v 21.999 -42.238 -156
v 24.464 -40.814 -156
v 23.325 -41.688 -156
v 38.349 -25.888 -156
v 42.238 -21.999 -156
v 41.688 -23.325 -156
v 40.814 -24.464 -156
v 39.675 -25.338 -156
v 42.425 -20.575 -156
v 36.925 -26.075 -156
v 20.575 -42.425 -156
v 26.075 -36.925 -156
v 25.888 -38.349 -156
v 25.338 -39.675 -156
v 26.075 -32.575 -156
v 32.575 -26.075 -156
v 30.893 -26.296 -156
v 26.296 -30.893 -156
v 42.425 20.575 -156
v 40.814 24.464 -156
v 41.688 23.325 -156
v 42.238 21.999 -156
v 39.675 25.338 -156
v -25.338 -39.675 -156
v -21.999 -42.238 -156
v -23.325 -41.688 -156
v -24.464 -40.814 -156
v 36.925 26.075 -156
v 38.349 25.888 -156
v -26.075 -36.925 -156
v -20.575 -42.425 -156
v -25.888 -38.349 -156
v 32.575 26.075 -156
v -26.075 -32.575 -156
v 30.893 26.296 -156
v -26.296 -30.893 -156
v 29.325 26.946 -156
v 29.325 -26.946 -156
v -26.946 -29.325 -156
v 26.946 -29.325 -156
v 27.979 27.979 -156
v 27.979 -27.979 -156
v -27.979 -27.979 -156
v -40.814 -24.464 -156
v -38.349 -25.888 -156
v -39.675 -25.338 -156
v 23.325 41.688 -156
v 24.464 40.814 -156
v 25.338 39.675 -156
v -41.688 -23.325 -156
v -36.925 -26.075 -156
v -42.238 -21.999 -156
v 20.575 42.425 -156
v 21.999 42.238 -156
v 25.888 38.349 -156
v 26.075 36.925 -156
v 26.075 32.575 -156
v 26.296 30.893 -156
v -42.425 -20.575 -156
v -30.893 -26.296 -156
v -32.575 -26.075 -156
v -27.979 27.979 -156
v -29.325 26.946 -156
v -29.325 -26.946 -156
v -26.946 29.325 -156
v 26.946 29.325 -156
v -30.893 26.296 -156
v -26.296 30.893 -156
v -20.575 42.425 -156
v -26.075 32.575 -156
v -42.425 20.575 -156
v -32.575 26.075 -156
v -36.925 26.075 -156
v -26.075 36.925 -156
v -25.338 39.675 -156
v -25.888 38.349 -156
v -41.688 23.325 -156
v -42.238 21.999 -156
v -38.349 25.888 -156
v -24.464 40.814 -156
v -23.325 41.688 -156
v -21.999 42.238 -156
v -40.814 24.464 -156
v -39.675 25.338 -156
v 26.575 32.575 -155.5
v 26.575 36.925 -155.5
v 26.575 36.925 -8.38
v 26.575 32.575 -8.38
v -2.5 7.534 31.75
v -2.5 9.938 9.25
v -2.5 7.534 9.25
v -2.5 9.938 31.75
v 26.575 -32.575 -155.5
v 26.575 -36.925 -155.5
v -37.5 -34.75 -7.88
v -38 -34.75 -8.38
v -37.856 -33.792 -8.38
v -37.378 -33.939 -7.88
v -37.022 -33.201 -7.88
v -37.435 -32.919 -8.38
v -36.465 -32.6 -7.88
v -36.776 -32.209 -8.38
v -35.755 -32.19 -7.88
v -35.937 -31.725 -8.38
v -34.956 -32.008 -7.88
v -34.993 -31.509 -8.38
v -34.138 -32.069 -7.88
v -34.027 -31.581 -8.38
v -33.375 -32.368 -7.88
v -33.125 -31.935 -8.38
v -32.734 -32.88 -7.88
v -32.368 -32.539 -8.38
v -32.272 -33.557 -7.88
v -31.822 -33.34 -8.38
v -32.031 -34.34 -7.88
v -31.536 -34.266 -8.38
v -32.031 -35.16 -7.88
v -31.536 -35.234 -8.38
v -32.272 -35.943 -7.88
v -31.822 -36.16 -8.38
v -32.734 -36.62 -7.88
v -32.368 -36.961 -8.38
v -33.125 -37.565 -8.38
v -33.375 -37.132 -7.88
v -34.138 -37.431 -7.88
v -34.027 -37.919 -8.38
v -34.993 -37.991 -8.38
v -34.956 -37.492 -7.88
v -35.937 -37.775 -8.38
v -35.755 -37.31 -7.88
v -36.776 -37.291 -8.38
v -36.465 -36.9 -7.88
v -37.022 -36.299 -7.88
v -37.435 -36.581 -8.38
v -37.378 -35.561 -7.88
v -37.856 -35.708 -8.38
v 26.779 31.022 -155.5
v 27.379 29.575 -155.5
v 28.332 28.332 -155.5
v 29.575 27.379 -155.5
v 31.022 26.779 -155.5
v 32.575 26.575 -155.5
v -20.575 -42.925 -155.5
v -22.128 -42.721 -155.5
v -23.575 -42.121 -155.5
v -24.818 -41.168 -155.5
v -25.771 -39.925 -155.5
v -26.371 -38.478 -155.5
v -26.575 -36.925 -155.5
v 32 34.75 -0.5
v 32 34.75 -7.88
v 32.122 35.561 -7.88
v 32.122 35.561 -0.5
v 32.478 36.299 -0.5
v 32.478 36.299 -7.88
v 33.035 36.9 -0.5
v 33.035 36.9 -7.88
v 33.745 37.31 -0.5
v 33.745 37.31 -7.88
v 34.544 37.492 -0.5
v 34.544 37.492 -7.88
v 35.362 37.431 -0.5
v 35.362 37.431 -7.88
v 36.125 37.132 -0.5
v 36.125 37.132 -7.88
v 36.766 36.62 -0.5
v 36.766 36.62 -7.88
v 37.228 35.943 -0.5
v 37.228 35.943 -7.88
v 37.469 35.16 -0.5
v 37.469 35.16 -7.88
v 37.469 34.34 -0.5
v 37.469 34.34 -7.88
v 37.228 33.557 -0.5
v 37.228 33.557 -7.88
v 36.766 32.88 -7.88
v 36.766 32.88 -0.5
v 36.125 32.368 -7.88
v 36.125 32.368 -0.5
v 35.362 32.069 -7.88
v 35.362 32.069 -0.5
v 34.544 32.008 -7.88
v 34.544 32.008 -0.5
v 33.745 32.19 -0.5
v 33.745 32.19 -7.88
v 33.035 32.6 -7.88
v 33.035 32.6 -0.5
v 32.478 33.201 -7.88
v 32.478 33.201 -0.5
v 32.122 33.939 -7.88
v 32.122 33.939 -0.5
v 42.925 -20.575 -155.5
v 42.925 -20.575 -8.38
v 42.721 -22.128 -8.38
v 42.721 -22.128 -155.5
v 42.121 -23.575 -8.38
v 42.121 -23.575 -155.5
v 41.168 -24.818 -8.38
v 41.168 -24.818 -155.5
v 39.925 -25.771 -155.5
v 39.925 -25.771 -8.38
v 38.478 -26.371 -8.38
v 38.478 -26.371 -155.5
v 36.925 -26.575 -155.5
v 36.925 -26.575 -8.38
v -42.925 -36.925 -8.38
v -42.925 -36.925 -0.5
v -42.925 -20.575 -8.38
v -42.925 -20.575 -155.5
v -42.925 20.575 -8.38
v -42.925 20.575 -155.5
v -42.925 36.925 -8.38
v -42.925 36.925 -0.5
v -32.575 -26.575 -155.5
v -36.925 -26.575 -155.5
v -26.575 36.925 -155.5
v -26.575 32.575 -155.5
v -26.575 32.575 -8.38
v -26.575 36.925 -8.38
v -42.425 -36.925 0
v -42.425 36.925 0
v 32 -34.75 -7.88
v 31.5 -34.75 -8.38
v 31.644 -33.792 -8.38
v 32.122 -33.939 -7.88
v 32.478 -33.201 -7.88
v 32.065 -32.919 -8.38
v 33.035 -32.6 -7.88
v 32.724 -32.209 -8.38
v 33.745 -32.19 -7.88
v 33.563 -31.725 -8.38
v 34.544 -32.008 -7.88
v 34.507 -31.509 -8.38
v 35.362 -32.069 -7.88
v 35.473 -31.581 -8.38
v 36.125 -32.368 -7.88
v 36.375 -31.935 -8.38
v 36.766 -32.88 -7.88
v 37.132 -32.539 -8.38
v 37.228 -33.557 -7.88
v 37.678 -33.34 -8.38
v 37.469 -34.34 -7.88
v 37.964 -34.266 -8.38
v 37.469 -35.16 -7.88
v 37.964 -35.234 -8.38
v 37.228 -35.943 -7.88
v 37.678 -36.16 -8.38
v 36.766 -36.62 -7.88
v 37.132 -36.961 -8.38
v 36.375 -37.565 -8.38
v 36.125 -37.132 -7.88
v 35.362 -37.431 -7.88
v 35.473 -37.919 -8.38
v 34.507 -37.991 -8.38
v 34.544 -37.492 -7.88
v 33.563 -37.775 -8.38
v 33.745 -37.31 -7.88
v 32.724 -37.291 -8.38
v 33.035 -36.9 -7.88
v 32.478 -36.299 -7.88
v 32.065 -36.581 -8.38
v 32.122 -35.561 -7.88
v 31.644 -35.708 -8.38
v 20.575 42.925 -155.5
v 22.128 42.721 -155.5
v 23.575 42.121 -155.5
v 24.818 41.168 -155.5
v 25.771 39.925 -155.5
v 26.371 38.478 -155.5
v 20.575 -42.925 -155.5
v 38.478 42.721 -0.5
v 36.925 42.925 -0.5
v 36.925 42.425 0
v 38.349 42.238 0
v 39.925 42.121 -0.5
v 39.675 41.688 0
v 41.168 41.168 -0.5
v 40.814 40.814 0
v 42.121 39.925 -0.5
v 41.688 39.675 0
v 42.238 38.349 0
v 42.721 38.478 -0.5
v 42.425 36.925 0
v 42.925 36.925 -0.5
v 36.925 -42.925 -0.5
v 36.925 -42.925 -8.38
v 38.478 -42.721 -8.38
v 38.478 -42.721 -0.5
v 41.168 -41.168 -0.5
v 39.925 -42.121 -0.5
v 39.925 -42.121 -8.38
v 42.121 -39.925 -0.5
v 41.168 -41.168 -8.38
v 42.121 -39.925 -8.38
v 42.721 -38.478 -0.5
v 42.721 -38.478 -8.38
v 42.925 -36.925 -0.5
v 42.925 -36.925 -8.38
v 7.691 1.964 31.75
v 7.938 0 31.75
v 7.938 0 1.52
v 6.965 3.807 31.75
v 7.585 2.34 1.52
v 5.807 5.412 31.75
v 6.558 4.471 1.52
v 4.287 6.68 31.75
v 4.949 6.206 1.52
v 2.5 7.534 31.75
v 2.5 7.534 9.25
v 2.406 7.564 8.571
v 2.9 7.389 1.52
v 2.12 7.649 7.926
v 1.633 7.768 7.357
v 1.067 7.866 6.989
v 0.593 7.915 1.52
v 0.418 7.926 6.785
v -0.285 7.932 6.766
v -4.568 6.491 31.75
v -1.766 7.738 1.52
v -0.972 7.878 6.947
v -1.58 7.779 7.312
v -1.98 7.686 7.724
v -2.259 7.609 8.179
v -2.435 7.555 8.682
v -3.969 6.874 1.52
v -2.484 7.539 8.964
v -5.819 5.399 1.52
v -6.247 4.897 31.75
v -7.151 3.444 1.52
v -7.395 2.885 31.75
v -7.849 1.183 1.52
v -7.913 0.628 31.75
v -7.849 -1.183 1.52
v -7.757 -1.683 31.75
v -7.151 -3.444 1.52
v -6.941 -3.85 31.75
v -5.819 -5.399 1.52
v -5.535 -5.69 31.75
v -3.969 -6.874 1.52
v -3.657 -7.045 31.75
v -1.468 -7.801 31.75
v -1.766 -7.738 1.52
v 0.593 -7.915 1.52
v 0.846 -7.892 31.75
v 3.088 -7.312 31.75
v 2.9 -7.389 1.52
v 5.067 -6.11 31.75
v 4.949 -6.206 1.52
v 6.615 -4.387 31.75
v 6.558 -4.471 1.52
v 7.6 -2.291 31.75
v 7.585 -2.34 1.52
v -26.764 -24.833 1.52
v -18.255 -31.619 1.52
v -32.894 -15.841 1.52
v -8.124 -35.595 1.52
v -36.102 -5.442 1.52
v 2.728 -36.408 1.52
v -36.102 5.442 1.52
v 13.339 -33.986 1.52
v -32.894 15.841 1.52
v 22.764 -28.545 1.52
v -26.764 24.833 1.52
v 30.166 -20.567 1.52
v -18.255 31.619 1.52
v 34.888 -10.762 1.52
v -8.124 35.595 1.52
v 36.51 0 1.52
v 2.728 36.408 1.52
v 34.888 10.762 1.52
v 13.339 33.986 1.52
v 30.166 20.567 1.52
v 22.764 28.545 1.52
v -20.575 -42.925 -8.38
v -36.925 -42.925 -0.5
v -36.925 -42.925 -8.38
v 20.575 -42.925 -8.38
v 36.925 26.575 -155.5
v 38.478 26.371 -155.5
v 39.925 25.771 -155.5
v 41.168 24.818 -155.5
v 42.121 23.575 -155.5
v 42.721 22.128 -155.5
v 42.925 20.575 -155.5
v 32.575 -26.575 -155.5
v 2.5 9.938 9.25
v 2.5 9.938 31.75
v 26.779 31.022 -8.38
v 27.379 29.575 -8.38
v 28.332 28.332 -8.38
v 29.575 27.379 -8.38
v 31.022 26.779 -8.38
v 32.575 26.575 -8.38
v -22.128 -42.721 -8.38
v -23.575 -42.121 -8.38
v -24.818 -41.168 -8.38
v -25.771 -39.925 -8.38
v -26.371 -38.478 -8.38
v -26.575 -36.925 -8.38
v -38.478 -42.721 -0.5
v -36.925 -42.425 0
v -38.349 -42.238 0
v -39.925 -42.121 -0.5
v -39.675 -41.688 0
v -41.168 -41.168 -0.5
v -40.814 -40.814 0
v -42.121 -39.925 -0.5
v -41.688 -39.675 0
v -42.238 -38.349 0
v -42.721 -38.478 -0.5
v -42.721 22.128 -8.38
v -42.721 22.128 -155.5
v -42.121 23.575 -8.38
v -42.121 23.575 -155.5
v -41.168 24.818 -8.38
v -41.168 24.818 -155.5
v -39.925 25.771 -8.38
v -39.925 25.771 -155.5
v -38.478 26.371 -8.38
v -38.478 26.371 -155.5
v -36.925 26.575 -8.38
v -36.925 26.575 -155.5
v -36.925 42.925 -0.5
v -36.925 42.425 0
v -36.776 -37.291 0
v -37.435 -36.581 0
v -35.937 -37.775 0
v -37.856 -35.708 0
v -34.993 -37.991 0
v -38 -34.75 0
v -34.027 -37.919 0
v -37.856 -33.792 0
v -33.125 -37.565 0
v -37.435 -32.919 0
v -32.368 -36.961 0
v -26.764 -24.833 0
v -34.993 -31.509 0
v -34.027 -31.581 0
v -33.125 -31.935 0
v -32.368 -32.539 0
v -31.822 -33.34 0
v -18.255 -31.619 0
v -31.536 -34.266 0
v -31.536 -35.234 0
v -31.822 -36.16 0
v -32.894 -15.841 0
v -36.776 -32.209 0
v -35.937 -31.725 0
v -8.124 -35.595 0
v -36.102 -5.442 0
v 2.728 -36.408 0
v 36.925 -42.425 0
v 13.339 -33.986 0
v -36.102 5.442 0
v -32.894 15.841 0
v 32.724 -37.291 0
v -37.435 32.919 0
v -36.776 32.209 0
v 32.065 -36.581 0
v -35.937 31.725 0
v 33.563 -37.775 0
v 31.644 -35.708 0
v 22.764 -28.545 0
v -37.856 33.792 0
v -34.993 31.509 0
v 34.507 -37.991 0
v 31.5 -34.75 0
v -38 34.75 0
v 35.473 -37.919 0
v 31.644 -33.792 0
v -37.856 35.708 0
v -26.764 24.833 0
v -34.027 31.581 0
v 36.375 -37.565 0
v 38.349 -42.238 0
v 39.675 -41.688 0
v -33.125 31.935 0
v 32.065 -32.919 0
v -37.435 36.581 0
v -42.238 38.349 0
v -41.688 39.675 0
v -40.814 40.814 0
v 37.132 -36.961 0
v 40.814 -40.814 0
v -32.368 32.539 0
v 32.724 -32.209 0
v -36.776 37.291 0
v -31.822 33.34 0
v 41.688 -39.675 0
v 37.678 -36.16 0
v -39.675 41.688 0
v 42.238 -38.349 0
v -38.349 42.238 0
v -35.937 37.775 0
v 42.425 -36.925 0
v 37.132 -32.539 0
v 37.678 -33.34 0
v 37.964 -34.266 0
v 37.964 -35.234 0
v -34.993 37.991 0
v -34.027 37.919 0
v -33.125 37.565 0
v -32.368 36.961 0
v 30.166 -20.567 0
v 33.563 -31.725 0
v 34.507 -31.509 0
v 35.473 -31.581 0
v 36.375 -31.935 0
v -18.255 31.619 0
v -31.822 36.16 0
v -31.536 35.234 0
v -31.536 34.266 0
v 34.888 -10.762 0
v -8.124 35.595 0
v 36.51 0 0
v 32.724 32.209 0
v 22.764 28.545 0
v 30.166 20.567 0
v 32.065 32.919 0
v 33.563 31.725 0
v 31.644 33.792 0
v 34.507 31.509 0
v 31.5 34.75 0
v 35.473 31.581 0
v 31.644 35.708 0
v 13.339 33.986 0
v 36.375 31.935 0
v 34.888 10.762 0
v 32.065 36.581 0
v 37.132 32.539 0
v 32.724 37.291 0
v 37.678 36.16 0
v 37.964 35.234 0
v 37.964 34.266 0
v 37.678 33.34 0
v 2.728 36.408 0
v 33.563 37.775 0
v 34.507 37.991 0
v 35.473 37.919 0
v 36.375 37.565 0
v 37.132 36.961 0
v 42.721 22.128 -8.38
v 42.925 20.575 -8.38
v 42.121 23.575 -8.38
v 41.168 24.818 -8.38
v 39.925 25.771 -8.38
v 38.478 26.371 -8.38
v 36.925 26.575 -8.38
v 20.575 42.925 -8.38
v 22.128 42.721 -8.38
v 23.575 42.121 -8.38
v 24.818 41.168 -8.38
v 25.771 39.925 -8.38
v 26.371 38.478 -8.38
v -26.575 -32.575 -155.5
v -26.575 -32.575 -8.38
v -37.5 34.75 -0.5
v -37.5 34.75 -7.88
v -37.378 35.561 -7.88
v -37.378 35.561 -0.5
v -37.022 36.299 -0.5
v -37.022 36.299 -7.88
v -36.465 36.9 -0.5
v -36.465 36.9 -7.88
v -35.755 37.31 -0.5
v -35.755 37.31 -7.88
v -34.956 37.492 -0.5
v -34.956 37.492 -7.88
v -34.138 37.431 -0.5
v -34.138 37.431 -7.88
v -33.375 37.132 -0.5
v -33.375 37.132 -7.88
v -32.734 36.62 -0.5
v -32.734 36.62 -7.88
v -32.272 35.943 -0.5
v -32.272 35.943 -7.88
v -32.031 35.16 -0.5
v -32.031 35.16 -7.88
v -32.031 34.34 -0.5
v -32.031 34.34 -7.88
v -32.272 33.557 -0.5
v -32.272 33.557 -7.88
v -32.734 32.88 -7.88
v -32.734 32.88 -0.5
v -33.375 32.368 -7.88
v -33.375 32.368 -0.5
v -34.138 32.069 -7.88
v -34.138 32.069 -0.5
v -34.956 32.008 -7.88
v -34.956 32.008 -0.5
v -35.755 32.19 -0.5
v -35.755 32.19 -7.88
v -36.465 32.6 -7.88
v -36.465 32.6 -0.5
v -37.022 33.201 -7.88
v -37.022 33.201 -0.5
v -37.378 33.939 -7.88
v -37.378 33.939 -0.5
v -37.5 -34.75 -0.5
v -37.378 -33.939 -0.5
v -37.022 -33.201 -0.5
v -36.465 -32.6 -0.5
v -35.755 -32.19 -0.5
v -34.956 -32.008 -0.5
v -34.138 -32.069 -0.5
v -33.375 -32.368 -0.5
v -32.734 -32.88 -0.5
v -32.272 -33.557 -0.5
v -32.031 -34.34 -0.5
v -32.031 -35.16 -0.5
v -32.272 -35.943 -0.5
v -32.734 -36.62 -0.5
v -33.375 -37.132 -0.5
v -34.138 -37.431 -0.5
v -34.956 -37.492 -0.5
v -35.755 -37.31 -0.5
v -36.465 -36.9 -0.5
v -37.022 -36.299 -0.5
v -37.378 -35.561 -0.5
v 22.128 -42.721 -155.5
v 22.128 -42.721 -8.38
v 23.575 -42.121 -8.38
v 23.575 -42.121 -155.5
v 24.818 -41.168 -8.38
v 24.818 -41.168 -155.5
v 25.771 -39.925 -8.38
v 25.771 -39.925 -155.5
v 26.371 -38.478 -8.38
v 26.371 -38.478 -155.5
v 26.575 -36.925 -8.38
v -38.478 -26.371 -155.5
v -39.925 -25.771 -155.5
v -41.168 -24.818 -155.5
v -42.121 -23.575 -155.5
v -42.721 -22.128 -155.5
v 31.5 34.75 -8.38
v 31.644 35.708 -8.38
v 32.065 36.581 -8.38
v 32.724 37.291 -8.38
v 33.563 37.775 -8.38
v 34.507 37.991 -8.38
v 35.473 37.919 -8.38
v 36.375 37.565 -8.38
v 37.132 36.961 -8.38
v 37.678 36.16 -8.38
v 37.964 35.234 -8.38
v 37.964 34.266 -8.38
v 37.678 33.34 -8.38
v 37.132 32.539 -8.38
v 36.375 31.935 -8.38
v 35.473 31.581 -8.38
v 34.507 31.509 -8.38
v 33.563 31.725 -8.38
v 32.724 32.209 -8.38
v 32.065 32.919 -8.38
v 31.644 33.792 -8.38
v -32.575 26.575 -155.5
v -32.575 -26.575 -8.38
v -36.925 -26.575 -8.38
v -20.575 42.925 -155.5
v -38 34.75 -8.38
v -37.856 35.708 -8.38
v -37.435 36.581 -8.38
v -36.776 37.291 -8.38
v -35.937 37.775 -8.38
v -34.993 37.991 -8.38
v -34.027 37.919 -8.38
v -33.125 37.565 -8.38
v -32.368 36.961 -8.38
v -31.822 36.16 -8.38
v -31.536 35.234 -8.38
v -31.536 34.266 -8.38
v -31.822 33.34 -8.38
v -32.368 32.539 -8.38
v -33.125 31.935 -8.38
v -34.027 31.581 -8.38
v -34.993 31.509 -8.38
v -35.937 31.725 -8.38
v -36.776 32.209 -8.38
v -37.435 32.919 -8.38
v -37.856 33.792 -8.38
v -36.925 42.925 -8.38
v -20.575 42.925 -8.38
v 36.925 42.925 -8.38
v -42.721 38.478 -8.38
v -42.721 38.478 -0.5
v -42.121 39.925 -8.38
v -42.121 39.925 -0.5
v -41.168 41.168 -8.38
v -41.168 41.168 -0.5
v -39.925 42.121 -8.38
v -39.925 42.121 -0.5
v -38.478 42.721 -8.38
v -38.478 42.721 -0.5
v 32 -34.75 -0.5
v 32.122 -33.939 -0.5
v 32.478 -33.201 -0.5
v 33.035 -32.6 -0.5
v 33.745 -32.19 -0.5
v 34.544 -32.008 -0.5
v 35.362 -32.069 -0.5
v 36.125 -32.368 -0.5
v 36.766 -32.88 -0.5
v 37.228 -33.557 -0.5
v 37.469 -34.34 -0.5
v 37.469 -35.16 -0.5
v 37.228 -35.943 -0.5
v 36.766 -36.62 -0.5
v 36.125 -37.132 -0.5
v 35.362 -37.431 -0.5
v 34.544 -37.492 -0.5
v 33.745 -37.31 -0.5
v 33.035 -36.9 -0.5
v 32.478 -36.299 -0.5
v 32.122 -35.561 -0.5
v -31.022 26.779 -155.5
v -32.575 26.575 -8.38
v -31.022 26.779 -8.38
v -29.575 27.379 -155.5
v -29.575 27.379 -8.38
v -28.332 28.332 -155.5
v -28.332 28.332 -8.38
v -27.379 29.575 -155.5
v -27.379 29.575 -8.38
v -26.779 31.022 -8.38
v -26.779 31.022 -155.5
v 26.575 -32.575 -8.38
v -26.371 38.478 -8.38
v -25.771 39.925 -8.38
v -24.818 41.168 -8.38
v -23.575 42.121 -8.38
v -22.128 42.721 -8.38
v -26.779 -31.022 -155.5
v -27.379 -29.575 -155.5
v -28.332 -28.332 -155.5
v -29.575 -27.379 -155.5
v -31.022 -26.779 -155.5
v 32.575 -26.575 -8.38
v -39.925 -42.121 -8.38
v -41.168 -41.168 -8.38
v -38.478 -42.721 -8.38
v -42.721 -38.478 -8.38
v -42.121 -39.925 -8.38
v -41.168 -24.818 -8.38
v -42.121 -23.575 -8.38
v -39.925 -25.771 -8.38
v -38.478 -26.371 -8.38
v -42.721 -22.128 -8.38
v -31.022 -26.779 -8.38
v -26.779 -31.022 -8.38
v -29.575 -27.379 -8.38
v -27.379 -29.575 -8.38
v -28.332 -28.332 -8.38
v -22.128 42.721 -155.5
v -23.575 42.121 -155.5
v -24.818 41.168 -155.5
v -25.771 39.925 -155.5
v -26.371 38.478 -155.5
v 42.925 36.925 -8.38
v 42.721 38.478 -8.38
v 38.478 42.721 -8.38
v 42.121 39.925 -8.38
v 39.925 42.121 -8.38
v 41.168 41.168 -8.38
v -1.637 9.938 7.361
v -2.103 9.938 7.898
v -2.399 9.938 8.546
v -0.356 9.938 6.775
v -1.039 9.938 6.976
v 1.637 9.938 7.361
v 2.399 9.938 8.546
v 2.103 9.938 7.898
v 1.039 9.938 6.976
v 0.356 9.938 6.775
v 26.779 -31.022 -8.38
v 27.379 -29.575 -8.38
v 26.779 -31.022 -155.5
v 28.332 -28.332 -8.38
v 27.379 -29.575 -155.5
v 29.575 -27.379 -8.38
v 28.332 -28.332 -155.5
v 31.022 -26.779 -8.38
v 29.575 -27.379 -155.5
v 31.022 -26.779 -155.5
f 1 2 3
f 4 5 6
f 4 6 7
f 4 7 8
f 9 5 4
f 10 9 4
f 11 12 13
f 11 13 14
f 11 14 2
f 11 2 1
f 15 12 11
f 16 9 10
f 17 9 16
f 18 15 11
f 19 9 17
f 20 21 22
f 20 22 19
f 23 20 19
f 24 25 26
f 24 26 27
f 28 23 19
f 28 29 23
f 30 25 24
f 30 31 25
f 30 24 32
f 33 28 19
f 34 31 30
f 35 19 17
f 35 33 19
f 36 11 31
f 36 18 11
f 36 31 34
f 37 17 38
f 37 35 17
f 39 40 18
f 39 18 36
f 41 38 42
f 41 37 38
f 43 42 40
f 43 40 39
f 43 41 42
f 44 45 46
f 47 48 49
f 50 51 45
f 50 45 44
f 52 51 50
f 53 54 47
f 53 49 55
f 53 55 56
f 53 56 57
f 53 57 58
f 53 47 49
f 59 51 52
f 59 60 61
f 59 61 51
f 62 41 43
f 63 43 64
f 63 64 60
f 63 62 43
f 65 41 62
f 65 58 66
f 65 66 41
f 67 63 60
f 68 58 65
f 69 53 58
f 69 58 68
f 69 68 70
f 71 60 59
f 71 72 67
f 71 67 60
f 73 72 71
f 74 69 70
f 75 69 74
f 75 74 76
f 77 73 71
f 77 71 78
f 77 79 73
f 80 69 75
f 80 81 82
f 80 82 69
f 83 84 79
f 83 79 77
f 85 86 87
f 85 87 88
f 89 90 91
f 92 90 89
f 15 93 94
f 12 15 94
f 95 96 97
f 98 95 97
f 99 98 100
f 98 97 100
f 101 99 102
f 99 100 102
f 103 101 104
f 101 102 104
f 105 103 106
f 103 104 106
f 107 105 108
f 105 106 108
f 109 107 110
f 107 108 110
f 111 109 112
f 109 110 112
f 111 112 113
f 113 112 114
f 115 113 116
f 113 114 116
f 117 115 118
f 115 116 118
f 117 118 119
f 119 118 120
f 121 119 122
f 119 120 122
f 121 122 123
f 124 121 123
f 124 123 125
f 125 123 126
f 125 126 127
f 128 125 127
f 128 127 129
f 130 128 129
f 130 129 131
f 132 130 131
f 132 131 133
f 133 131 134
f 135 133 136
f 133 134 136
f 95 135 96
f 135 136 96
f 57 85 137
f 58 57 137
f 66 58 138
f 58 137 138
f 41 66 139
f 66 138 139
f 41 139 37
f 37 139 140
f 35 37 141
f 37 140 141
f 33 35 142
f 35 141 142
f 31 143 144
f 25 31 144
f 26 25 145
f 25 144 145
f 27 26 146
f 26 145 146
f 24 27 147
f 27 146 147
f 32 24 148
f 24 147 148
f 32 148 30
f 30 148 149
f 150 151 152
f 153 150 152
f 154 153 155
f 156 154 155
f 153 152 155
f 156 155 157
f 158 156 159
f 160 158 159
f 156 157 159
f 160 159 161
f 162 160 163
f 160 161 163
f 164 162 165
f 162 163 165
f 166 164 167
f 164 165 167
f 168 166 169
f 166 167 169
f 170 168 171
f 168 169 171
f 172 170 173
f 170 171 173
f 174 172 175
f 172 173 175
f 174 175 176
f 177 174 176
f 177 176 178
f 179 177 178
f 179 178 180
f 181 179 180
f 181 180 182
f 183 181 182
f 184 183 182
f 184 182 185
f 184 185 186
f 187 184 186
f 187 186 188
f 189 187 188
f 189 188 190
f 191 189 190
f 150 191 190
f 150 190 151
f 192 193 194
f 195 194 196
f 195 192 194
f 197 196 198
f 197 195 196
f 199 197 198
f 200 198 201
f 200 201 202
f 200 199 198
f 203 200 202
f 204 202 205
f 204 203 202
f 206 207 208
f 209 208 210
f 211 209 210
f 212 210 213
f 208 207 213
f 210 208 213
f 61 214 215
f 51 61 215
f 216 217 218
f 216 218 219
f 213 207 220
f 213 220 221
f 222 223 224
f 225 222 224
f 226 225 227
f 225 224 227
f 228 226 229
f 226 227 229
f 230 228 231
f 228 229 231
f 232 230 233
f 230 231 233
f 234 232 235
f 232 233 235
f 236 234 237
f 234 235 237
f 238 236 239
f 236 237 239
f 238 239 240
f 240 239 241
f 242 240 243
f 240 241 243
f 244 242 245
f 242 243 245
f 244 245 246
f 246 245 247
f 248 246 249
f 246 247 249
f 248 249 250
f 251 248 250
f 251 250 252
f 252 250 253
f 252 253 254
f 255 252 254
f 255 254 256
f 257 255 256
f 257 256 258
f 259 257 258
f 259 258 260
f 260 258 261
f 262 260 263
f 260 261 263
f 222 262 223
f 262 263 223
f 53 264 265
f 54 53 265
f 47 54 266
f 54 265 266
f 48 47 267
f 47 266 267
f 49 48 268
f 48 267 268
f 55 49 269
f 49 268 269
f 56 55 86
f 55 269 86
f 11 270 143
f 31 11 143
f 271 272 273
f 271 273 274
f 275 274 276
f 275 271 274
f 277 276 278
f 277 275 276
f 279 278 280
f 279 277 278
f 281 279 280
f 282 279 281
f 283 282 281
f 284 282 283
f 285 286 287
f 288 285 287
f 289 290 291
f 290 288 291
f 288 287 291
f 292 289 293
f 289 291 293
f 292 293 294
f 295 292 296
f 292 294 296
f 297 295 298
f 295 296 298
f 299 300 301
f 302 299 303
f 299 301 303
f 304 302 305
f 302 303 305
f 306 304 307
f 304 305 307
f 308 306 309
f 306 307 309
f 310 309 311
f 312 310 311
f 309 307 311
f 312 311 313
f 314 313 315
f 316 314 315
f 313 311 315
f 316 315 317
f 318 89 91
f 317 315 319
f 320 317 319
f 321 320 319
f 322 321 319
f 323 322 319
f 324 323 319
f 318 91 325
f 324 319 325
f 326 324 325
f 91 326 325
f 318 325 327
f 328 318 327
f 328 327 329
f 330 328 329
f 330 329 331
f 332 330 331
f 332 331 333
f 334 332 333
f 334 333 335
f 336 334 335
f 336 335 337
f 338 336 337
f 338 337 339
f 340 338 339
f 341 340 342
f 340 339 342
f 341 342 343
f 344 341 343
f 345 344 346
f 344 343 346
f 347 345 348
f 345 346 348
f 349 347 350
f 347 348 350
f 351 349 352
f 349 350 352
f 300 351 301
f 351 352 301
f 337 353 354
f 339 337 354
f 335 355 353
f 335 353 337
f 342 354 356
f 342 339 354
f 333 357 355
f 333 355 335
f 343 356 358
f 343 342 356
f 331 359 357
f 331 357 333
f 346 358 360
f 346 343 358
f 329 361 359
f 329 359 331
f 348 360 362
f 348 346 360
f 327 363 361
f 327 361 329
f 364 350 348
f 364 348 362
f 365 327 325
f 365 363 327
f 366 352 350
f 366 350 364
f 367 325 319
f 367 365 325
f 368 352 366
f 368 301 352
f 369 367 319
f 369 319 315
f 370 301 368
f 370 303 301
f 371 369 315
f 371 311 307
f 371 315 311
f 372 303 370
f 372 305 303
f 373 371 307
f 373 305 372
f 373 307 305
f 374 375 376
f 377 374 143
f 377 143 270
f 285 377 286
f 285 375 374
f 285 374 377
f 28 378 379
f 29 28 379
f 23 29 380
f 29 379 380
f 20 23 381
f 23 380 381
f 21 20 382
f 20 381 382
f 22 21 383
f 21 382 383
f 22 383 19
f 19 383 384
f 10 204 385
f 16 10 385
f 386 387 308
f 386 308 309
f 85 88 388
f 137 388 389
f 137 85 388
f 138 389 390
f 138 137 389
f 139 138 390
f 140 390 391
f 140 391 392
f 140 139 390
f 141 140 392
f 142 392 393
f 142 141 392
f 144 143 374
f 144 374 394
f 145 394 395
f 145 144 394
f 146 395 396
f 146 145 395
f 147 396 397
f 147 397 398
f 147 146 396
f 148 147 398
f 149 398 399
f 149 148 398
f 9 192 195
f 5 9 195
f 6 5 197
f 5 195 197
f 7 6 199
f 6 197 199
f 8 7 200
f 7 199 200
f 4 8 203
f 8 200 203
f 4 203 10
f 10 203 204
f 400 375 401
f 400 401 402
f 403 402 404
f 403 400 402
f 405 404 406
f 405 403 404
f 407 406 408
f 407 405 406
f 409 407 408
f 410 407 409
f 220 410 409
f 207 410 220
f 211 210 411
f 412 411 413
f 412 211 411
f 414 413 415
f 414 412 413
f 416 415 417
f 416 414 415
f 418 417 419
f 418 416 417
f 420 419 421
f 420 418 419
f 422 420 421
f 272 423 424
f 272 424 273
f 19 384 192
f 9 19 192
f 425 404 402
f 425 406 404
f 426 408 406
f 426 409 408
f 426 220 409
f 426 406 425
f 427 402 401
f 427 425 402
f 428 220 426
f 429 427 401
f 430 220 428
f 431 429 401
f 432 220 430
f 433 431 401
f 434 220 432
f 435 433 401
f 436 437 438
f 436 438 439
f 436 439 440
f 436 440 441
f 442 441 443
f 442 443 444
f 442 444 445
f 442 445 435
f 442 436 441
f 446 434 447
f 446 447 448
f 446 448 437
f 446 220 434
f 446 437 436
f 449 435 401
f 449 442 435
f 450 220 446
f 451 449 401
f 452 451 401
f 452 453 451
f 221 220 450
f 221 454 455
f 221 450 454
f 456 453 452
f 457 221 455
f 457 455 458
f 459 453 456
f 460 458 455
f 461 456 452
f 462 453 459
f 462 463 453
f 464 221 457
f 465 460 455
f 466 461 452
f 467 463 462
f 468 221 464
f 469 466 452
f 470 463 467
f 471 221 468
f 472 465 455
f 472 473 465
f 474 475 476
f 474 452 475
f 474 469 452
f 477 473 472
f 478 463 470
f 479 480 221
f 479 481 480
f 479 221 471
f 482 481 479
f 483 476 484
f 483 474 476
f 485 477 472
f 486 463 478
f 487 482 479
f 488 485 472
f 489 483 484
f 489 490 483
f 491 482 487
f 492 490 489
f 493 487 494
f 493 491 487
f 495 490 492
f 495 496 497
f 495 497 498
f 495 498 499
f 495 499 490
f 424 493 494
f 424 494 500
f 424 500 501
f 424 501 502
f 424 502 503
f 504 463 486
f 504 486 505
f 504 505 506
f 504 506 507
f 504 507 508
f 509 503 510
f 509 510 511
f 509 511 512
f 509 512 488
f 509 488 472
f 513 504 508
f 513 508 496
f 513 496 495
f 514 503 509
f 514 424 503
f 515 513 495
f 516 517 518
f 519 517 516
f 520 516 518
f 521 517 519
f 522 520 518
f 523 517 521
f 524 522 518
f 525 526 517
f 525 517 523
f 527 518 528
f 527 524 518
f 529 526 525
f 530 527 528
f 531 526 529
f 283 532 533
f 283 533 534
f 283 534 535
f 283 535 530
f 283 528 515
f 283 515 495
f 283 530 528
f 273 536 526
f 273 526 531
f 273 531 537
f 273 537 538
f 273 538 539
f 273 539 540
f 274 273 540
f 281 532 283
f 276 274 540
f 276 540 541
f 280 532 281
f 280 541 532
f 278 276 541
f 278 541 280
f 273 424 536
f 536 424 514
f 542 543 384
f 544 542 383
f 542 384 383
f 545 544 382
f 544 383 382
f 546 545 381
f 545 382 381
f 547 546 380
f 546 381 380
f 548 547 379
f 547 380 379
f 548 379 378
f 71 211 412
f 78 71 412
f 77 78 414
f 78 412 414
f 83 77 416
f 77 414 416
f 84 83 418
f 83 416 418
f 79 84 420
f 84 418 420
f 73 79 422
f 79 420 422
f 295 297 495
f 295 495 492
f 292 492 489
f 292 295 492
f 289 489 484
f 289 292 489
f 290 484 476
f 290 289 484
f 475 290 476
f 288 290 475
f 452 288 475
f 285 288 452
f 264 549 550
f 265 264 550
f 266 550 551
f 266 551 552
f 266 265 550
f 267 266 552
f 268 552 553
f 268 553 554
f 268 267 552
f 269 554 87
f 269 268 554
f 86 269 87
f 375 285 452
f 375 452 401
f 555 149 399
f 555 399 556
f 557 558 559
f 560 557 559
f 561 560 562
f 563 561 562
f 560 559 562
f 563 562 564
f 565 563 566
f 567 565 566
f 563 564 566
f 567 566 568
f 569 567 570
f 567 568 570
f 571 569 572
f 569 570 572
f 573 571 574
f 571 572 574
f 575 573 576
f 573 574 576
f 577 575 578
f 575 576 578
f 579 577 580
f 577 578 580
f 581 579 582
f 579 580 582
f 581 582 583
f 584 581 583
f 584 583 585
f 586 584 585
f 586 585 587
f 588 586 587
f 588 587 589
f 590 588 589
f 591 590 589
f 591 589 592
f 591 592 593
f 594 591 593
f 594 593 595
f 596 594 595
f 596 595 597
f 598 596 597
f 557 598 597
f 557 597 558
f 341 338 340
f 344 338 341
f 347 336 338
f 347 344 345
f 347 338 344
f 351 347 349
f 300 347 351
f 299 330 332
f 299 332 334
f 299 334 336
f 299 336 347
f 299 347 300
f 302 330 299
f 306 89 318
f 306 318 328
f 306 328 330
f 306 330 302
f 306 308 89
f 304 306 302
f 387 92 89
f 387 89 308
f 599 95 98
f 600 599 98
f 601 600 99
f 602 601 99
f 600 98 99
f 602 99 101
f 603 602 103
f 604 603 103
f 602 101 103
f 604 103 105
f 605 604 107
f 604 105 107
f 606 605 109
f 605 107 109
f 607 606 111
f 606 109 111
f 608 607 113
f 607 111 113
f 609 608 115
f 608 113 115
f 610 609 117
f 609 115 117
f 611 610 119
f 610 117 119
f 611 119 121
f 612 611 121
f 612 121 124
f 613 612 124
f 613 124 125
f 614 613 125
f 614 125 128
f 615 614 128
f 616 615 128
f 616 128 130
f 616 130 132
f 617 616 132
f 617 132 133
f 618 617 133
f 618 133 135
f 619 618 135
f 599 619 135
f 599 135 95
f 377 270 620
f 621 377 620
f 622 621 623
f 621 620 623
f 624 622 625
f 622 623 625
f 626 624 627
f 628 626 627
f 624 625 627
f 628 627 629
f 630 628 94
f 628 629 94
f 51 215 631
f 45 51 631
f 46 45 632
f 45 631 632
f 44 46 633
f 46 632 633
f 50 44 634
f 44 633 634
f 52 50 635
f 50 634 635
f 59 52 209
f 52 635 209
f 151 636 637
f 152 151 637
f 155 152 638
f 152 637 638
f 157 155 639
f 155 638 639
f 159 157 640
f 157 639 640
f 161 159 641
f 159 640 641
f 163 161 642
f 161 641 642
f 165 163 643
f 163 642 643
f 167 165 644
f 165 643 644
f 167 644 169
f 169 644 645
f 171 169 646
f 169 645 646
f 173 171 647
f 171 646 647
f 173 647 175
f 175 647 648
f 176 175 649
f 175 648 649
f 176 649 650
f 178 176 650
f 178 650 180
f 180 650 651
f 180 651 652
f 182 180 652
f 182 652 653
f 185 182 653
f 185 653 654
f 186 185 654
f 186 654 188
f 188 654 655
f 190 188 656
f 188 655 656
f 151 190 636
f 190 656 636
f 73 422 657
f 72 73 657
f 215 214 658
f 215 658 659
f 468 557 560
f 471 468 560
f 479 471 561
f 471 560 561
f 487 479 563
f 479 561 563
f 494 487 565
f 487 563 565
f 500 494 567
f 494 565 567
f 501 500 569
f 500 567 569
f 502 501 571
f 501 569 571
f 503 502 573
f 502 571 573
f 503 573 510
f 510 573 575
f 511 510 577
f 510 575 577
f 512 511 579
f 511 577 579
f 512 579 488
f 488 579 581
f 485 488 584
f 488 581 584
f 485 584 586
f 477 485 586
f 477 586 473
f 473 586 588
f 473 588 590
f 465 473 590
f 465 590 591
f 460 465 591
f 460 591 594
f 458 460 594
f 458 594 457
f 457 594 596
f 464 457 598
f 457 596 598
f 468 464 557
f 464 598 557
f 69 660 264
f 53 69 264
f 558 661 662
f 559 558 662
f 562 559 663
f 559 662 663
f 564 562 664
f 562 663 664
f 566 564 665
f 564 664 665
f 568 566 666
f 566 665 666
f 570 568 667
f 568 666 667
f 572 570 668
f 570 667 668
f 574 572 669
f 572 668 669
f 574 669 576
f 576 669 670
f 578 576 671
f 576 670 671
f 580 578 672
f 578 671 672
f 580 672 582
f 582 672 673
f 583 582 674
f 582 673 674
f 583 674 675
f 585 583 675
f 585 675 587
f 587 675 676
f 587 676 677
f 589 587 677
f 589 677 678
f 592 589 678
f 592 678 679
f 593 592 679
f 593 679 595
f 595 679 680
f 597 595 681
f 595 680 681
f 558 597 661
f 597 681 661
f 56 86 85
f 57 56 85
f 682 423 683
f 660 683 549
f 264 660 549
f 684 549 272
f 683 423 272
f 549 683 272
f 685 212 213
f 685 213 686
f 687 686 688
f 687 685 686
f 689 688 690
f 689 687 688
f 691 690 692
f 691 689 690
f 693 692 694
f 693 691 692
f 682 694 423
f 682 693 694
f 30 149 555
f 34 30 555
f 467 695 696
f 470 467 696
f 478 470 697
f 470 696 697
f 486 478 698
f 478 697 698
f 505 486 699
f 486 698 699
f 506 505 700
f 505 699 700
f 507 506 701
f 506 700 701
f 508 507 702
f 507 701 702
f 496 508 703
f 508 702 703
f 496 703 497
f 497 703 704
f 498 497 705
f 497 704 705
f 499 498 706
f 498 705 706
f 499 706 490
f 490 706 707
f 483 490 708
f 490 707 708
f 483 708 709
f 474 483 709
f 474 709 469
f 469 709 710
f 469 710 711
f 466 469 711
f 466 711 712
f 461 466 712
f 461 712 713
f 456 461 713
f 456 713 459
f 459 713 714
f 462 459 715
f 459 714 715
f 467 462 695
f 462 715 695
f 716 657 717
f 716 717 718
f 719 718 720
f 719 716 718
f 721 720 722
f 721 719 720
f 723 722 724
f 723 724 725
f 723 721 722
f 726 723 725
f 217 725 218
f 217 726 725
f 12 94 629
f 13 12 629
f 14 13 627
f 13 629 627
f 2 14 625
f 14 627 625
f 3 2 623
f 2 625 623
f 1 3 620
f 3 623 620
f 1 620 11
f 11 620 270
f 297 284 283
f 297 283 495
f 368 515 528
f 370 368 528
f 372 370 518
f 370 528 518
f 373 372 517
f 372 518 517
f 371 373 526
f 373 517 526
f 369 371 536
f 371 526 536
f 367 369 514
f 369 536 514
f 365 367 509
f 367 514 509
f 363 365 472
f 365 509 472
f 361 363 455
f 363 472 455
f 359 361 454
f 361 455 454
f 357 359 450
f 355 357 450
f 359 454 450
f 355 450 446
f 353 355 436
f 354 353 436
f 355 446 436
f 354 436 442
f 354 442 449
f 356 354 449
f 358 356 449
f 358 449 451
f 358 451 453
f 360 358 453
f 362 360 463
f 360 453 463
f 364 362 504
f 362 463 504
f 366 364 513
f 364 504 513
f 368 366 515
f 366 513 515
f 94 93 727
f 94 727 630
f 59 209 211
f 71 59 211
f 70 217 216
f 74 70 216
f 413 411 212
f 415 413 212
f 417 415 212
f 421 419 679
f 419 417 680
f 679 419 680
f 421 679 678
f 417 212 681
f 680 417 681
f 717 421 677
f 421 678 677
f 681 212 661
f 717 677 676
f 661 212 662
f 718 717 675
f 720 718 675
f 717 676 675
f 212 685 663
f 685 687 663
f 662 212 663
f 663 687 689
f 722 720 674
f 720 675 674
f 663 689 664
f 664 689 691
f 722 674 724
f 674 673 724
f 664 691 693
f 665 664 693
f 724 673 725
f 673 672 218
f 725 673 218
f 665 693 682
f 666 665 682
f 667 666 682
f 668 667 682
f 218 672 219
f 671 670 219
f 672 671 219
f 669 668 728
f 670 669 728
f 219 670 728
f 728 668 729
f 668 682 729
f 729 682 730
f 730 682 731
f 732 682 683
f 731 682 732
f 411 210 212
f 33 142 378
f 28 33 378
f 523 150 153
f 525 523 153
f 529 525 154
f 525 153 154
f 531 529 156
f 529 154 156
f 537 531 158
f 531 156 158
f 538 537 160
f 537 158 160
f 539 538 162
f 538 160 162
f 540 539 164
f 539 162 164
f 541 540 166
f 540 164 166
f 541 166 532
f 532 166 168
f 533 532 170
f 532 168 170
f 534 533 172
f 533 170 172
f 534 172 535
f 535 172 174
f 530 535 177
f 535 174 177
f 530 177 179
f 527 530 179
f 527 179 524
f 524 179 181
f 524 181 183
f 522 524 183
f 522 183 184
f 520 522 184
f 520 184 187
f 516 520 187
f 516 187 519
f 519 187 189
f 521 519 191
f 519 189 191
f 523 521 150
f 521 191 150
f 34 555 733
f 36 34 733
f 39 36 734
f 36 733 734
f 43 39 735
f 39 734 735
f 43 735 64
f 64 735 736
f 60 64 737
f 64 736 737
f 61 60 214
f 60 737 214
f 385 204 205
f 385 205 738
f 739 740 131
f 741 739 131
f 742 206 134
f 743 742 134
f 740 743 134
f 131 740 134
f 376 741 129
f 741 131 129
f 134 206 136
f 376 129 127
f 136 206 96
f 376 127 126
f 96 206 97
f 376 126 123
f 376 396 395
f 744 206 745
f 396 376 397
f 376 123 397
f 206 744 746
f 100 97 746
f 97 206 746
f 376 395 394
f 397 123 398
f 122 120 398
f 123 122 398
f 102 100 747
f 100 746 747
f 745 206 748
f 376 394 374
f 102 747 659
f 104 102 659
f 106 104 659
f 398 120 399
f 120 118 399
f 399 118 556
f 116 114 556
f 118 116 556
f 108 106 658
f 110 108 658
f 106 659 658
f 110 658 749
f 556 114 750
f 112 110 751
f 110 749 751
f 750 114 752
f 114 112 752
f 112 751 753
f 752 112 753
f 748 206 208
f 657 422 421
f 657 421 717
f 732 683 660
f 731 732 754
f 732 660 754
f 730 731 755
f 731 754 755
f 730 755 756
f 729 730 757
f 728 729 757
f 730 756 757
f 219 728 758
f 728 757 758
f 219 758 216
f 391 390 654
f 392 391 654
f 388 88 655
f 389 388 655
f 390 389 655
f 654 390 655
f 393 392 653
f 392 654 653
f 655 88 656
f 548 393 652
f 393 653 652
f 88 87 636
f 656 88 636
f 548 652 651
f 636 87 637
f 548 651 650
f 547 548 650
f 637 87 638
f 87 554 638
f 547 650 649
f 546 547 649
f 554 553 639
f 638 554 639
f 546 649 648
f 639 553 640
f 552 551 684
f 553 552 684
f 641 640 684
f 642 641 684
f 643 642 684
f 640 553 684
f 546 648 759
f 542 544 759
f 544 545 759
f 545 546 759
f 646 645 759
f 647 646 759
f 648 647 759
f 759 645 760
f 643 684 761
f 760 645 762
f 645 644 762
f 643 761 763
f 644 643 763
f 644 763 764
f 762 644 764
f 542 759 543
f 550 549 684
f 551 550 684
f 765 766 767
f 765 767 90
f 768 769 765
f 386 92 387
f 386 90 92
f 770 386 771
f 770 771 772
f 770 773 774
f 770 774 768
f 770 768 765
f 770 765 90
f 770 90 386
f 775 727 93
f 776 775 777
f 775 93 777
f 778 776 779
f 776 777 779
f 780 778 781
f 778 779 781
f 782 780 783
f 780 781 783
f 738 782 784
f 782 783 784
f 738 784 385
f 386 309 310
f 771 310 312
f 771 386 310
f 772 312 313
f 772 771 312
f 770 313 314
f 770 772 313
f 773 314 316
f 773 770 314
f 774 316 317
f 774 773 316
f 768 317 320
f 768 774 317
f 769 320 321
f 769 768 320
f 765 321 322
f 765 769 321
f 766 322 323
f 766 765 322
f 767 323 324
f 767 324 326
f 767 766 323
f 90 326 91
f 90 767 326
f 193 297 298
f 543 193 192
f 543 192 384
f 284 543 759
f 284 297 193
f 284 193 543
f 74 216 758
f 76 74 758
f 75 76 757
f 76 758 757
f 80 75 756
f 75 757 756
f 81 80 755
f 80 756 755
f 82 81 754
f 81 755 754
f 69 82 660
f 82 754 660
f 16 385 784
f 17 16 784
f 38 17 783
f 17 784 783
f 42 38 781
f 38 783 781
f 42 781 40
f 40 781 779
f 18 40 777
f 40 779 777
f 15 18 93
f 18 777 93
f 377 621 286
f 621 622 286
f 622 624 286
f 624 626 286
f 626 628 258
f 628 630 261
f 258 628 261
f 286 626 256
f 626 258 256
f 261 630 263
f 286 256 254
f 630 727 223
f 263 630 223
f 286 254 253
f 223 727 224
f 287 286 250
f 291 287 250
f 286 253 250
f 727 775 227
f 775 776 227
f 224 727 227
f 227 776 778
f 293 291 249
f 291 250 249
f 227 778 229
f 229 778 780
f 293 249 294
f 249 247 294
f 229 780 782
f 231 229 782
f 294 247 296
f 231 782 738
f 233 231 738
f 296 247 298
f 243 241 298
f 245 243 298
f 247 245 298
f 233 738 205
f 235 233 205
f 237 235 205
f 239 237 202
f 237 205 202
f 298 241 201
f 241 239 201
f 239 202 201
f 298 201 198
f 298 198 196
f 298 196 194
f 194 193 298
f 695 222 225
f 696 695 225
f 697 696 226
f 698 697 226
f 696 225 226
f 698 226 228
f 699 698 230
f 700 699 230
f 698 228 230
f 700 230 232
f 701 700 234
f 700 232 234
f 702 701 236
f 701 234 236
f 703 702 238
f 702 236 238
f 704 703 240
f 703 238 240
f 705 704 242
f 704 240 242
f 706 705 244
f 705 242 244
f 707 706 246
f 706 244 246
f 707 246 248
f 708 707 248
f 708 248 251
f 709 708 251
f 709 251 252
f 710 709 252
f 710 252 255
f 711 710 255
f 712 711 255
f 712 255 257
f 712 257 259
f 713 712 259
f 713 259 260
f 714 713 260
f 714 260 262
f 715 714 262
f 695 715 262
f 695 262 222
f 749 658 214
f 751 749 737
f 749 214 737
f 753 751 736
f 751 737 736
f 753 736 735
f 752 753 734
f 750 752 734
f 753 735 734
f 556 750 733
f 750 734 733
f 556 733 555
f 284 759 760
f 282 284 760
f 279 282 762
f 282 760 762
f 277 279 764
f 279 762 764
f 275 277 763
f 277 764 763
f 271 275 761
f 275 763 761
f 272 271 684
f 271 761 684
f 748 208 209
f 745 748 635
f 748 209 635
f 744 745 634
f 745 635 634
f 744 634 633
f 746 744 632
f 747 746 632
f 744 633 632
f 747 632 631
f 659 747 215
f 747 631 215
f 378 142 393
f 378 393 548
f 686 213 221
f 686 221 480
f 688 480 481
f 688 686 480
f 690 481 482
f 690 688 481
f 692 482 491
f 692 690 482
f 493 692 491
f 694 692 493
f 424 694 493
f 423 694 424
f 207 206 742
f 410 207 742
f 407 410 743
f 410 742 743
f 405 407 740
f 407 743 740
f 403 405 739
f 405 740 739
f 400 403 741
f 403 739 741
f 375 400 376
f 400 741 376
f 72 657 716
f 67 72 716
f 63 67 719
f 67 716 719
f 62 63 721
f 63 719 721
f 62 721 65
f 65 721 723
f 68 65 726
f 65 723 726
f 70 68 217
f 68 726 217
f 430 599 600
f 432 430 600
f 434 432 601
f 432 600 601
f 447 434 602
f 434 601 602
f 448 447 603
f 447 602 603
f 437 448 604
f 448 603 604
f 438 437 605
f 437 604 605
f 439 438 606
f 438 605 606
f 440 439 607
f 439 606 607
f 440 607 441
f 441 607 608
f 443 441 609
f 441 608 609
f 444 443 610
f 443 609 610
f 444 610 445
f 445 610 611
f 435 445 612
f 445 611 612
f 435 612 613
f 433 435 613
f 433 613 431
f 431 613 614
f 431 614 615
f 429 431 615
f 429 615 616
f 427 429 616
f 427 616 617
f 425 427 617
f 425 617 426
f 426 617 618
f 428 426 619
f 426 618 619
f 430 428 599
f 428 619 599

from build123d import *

# Parameters (mm, degrees)
SKETCH1_W                 = 85.85
SKETCH1_H                 = 85.85
BOSS_EXTRUDE1_DEPTH       = 8.38
BOSS_EXTRUDE3_DEPTH       = 147.62
FILLET4_R                 = 6
FILLET5_R                 = 6
SKETCH4_R                 = 36.51
BOSS_EXTRUDE4_DEPTH       = 1.52
SKETCH5_R                 = 7.9375
BOSS_EXTRUDE5_DEPTH       = 30.23
BOSS_EXTRUDE6_DEPTH       = 5
F_5_0MM_DOWEL_HOLE1_D     = 5.5
F_5_0MM_DOWEL_HOLE1_DEPTH = 8.38
CHAMFER1_SIZE             = 0.5


with BuildPart() as part:
    # Sketch1 → Boss-Extrude1 (new body)
    with BuildSketch(Plane.XY):
        Rectangle(SKETCH1_W, SKETCH1_H)
    extrude(amount=-BOSS_EXTRUDE1_DEPTH)

    # Sketch2 → Boss-Extrude3 (add)
    with BuildSketch(Plane(origin=(0, 0, -8.38), x_dir=(-1, 0, 0), z_dir=(0, 0, -1))):
        Polygon((-26.575, -42.925), (26.575, -42.925), (26.575, -26.575), (42.925, -26.575), (42.925, 26.575), (26.575, 26.575), (26.575, 42.925), (-26.575, 42.925), (-26.575, 26.575), (-42.925, 26.575), (-42.925, -26.575), (-26.575, -26.575), align=None)
    extrude(amount=BOSS_EXTRUDE3_DEPTH)

    # Fillet4
    fillet4_edges = [part.edges().sort_by_distance(p)[0] for p in [
        (42.925, -26.575, -82.19),
        (26.575, -26.575, -82.19),
        (26.575, -42.925, -82.19),
        (-26.575, -42.925, -82.19),
        (-26.575, -26.575, -82.19),
        (-42.925, -26.575, -82.19),
        (-42.925, 26.575, -82.19),
        (-26.575, 26.575, -82.19),
        (-26.575, 42.925, -82.19),
        (26.575, 42.925, -82.19),
        (26.575, 26.575, -82.19),
        (42.925, 26.575, -82.19),
    ]]
    fillet(fillet4_edges, radius=FILLET4_R)

    # Fillet5
    fillet5_edges = [part.edges().sort_by_distance(p)[0] for p in [
        (-42.925, -42.925, -4.19),
        (42.925, -42.925, -4.19),
        (42.925, 42.925, -4.19),
        (-42.925, 42.925, -4.19),
    ]]
    fillet(fillet5_edges, radius=FILLET5_R)

    # Sketch4 → Boss-Extrude4 (add)
    with BuildSketch(Plane.XY):
        Circle(SKETCH4_R)
    extrude(amount=BOSS_EXTRUDE4_DEPTH)

    # Sketch5 → Boss-Extrude5 (add)
    with BuildSketch(Plane.XY.offset(1.52)):
        Circle(SKETCH5_R)
    extrude(amount=BOSS_EXTRUDE5_DEPTH)

    # Sketch6 → Boss-Extrude6 (add)
    with BuildSketch(Plane(origin=(0, 9.9375, 0), x_dir=(1, 0, 0), z_dir=(0, 1, 0))):
        with BuildLine():
            Line((-2.5, -31.75), (2.5, -31.75))
            Line((2.5, -31.75), (2.5, -9.25))
            ThreePointArc((2.5, -9.25), (0, -6.75), (-2.5, -9.25))
            Line((-2.5, -9.25), (-2.5, -31.75))
        make_face()
    extrude(amount=-BOSS_EXTRUDE6_DEPTH)

    # Ø5.0mm Dowel Hole1
    with Locations(Plane.XY):
        with Locations((-34.75, 34.75), (34.75, 34.75), (34.75, -34.75), (-34.75, -34.75)):
            Hole(F_5_0MM_DOWEL_HOLE1_D / 2, depth=F_5_0MM_DOWEL_HOLE1_DEPTH)

    # Chamfer1
    chamfer1_edges = [part.edges().sort_by_distance(p)[0] for p in [
        (-42.925, 0, 0),
        (42.925, 0, 0),
        (0, 42.925, 0),
        (0, -42.925, 0),
        (-41.167640687, 41.167640687, 0),
        (41.167640687, 41.167640687, 0),
        (41.167640687, -41.167640687, 0),
        (-41.167640687, -41.167640687, 0),
        (-32, -34.75, 0),
        (-32, -34.75, -8.38),
        (37.5, -34.75, 0),
        (37.5, -34.75, -8.38),
        (37.5, 34.75, 0),
        (37.5, 34.75, -8.38),
        (-32, 34.75, 0),
        (-32, 34.75, -8.38),
        (34.75, -26.575, -156),
        (42.925, 0, -156),
        (26.575, 34.75, -156),
        (34.75, 26.575, -156),
        (26.575, -34.75, -156),
        (0, -42.925, -156),
        (-26.575, -34.75, -156),
        (-34.75, -26.575, -156),
        (-42.925, 0, -156),
        (-34.75, 26.575, -156),
        (-26.575, 34.75, -156),
        (0, 42.925, -156),
        (41.167640687, 24.817640687, -156),
        (24.817640687, 41.167640687, -156),
        (-24.817640687, 41.167640687, -156),
        (-41.167640687, 24.817640687, -156),
        (-41.167640687, -24.817640687, -156),
        (-24.817640687, -41.167640687, -156),
        (24.817640687, -41.167640687, -156),
        (41.167640687, -24.817640687, -156),
        (28.332359313, -28.332359313, -156),
        (-28.332359313, -28.332359313, -156),
        (-28.332359313, 28.332359313, -156),
        (28.332359313, 28.332359313, -156),
    ]]
    chamfer(chamfer1_edges, length=CHAMFER1_SIZE)


solid = part.part
